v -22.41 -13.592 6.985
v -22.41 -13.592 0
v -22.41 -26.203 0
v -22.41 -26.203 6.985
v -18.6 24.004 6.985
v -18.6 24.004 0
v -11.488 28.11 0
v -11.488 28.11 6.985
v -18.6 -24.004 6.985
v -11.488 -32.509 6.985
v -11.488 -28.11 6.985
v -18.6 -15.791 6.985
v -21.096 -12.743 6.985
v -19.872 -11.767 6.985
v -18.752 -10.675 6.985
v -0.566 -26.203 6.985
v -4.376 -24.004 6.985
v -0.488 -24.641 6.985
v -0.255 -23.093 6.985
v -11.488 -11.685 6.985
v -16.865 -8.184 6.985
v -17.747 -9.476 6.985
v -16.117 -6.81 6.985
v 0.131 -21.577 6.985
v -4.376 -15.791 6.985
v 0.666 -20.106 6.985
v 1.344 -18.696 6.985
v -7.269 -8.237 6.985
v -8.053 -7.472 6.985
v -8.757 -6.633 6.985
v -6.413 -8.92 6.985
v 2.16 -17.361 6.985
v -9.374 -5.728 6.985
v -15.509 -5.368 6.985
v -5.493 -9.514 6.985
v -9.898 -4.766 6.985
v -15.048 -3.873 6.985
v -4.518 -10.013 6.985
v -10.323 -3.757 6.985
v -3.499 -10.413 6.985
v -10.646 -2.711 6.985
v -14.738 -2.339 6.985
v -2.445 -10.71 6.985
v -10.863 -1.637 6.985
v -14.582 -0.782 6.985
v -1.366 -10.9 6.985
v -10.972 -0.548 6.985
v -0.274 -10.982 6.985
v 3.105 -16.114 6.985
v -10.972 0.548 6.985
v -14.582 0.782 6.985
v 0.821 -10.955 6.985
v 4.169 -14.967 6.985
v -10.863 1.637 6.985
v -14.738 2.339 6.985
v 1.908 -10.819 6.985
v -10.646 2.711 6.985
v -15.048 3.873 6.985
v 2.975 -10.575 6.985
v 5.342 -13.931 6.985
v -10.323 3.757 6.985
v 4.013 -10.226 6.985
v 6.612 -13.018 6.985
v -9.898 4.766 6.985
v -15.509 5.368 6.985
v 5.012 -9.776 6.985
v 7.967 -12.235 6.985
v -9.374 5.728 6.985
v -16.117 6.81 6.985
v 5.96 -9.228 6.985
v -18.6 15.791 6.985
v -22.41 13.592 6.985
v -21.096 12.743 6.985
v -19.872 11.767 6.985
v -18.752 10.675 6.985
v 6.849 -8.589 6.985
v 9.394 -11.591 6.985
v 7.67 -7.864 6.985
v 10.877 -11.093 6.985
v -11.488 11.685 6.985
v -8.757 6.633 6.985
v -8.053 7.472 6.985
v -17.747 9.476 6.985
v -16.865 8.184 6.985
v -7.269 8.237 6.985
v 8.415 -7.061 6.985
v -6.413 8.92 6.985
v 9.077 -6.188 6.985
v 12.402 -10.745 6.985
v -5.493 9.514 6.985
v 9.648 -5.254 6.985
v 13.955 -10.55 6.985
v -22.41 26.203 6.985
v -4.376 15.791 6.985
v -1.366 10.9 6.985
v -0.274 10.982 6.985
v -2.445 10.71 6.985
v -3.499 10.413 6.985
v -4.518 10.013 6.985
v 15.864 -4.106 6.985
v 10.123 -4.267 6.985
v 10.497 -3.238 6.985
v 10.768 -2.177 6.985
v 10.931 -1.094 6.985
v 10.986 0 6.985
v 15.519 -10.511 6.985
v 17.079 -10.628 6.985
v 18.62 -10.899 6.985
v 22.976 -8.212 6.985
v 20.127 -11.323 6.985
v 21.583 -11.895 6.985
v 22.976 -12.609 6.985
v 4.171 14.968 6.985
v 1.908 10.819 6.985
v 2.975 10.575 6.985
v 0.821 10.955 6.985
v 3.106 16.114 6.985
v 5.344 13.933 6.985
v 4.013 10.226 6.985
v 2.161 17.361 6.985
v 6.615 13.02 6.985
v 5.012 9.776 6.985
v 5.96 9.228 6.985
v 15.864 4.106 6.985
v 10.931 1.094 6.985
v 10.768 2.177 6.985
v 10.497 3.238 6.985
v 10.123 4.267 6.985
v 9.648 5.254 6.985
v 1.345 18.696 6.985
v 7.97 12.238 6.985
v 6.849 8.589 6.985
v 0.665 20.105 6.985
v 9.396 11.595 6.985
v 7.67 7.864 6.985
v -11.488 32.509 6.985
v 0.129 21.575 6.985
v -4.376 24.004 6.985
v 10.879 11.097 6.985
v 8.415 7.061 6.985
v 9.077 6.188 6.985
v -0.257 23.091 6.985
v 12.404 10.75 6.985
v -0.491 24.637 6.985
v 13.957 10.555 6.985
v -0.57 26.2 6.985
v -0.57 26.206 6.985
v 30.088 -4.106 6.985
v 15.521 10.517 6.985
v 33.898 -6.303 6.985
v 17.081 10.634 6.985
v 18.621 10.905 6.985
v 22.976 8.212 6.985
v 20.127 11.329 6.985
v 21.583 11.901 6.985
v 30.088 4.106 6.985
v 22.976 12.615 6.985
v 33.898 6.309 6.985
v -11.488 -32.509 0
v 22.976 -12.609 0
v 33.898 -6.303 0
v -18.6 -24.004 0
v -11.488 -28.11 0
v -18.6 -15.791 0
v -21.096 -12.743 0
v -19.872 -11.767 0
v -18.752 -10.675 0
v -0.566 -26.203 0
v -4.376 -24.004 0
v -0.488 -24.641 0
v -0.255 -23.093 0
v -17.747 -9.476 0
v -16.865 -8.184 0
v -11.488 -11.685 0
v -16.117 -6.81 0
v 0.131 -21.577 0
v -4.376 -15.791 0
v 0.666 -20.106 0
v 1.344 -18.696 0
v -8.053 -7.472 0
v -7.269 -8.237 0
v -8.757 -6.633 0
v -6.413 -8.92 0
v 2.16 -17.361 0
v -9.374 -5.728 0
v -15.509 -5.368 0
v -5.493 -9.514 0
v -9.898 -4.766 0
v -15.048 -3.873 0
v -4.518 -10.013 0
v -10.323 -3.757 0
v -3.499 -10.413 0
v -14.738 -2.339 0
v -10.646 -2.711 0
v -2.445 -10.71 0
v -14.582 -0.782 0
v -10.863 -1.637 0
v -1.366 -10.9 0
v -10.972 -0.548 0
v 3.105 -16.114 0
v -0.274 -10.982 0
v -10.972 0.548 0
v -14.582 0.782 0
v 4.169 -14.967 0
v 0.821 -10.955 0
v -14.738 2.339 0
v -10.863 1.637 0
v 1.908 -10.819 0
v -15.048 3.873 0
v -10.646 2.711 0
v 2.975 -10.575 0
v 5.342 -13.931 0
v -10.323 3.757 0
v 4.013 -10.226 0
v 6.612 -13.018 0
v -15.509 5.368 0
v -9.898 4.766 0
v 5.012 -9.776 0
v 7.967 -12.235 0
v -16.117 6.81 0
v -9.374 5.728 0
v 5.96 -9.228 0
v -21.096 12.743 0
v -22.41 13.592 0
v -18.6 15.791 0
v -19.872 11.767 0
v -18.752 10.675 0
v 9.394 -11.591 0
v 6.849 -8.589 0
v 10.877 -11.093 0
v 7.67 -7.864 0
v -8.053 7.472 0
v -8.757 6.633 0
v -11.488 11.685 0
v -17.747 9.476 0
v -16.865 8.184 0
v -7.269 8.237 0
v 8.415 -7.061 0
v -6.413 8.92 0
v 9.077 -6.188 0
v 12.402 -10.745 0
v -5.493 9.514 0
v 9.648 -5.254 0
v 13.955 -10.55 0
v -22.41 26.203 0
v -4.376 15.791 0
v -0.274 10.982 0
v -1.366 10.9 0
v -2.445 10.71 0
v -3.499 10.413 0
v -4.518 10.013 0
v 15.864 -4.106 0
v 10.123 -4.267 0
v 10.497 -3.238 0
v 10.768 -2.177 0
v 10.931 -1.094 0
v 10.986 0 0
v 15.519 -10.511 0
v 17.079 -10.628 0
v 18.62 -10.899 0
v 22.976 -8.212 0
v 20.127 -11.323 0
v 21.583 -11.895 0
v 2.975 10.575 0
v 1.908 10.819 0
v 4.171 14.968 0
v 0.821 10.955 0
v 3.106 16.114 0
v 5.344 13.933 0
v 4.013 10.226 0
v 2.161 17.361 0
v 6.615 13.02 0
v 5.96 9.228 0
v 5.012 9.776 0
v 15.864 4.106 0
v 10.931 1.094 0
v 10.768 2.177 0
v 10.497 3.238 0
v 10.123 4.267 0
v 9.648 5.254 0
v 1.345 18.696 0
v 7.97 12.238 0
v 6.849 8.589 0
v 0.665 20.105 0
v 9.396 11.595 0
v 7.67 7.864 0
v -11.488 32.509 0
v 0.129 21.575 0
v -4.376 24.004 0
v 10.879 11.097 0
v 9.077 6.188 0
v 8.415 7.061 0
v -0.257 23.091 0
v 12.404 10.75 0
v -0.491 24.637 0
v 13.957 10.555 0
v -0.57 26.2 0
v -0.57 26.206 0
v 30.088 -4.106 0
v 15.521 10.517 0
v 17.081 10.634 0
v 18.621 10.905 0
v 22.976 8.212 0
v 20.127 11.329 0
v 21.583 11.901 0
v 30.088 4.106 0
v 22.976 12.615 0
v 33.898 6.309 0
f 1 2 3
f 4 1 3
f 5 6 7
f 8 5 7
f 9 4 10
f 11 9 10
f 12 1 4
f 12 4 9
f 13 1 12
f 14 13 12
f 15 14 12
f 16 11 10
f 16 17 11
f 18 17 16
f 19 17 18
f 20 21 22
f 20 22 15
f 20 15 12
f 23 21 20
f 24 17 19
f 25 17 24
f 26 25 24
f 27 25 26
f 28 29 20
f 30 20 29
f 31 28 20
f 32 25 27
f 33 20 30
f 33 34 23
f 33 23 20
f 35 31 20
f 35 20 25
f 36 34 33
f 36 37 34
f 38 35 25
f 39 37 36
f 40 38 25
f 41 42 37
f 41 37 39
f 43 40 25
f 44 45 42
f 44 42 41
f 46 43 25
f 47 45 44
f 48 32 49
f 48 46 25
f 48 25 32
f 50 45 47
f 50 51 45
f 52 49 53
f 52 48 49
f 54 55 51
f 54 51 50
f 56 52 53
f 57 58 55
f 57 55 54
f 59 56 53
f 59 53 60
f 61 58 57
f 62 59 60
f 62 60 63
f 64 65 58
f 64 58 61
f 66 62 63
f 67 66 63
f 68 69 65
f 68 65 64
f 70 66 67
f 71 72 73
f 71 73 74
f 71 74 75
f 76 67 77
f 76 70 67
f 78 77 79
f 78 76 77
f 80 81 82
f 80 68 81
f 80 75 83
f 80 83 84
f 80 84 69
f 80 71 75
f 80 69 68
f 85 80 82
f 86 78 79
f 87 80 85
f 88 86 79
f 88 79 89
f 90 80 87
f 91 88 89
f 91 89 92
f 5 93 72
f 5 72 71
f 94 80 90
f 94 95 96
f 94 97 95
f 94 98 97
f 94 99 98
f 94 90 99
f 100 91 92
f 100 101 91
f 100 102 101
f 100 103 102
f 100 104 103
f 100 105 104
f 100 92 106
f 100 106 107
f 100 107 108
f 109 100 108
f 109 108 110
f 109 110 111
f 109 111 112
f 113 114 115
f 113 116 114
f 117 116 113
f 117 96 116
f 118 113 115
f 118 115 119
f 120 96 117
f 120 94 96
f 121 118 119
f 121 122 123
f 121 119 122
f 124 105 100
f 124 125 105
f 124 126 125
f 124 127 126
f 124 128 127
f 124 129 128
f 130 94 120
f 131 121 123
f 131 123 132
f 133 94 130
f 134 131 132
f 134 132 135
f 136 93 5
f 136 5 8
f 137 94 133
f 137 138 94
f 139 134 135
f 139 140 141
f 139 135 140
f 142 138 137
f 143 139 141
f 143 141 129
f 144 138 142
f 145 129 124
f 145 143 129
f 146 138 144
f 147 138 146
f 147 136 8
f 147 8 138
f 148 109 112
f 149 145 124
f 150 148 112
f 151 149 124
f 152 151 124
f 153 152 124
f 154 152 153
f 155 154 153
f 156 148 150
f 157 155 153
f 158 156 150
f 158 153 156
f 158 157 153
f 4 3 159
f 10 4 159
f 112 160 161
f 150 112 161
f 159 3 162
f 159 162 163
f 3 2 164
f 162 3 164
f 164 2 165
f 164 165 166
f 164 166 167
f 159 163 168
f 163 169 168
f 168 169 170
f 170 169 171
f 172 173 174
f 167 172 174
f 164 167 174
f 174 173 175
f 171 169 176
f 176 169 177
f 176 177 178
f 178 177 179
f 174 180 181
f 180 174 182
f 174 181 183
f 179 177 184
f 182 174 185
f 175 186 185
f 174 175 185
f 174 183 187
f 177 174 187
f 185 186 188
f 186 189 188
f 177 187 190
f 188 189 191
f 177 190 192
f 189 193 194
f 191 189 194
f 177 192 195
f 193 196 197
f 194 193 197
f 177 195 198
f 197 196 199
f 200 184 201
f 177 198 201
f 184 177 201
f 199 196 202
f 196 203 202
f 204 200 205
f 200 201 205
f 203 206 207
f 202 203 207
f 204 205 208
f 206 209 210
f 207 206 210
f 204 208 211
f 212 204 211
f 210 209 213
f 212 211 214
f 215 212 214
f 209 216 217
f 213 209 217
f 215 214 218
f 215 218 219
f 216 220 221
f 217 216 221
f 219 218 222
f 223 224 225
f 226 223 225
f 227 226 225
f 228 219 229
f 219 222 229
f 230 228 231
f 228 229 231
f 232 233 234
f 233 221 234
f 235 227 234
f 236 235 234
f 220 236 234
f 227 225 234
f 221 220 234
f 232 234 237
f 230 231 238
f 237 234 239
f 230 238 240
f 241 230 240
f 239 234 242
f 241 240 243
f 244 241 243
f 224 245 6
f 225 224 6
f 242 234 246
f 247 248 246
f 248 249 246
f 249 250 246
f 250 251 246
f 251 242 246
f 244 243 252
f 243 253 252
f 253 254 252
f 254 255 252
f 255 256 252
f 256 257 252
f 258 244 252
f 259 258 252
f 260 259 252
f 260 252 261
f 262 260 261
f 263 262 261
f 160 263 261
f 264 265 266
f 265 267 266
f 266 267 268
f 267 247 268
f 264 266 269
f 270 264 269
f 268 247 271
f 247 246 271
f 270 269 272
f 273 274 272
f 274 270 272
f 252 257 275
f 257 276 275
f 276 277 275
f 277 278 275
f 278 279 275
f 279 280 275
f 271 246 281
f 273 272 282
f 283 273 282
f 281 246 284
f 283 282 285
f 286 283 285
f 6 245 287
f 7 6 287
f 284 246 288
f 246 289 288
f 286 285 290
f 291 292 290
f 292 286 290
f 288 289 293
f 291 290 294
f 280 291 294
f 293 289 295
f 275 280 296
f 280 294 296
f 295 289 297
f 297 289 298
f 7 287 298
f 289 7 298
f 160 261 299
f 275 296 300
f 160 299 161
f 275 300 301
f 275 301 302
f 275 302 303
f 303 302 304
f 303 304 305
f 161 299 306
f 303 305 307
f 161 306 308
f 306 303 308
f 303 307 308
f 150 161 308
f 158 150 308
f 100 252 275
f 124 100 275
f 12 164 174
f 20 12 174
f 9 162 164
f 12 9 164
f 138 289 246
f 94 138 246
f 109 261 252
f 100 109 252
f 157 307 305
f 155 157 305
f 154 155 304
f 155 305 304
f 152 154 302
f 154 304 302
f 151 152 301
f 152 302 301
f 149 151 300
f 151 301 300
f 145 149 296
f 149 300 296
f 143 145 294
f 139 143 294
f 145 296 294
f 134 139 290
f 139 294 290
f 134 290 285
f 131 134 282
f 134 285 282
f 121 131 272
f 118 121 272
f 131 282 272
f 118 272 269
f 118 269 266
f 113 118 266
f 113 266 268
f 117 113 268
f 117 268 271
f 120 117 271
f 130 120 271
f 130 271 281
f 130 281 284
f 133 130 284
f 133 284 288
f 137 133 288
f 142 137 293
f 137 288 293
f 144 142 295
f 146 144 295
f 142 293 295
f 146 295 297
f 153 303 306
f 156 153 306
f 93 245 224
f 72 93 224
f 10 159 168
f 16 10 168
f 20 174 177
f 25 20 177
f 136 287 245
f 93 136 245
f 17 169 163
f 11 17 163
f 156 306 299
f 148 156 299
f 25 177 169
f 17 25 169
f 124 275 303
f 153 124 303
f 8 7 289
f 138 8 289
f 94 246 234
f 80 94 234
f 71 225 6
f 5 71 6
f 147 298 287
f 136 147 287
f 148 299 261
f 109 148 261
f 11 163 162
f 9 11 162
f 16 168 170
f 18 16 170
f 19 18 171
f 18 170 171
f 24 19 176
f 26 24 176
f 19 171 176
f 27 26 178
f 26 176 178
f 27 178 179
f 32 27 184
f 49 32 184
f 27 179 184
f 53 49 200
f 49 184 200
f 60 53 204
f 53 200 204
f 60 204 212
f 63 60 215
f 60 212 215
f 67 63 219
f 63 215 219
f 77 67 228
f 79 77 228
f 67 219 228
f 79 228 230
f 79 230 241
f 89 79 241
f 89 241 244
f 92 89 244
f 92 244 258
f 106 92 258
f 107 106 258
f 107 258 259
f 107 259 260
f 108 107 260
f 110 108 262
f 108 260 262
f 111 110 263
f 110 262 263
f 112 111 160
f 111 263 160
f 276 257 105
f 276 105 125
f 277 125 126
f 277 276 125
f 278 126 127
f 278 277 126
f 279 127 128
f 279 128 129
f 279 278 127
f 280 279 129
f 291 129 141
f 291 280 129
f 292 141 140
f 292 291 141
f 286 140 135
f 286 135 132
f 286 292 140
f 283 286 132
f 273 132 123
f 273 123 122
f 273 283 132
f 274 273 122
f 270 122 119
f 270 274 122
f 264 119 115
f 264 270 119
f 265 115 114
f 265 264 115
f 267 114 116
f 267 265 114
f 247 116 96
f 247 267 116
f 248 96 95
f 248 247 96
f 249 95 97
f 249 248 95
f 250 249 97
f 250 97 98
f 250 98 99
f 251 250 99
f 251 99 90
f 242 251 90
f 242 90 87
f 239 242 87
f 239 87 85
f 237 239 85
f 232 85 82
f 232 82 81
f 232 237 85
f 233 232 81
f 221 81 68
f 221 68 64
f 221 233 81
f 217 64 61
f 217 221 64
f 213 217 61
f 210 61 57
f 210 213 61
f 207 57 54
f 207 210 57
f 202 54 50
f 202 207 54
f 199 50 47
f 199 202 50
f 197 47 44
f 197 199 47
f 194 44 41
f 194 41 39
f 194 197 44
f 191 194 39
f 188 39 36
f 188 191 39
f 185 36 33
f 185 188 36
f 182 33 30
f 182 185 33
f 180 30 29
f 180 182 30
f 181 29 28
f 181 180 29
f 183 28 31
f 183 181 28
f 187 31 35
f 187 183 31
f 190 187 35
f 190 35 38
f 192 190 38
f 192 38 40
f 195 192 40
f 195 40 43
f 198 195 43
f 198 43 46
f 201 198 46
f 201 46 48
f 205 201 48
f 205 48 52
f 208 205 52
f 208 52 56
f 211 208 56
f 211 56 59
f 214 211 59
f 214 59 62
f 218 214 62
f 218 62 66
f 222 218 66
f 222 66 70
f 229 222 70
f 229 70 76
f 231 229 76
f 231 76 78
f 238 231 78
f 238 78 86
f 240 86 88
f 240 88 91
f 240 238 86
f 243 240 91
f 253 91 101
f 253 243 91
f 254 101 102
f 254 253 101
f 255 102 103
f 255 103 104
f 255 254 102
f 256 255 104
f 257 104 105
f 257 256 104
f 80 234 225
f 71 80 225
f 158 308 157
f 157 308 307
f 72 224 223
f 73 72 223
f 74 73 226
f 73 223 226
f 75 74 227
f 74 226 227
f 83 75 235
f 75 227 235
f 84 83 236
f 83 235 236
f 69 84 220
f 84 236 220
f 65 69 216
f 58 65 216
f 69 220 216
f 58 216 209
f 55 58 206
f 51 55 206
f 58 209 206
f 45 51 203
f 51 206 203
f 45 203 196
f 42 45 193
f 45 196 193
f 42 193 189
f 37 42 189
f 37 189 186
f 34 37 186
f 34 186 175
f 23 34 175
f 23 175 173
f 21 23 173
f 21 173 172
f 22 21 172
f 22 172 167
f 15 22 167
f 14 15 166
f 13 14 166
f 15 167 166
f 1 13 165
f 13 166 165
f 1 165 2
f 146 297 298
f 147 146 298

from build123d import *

# Parameters (mm, degrees)
F0_R     = 10.9855
F1_DEPTH = 6.985


with BuildPart() as f1:
    # F0 (on Top) → F1 (new body)
    with BuildSketch(Plane.XY):
        with BuildLine():
            Line((-0.570141, 26.199883), (-0.570143, 26.205813))
            Line((-0.570143, 26.205813), (-11.487829, 32.509142))
            Line((-11.487829, 32.509142), (-22.409829, 26.203322))
            Line((-22.409829, 26.203322), (-22.409829, 13.591683))
            ThreePointArc((-22.409829, 13.591683), (-14.562667, 0), (-22.409828, -13.591683))
            Line((-22.409828, -13.591683), (-22.409828, -26.203322))
            Line((-22.409828, -26.203322), (-11.487828, -32.509142))
            Line((-11.487828, -32.509142), (-0.565829, -26.203322))
            ThreePointArc((-0.565829, -26.203322), (7.280049, -12.609415), (22.975657, -12.608674))
            Line((22.975657, -12.608674), (33.897656, -6.302854))
            Line((33.897656, -6.302854), (33.897656, 6.308785))
            Line((33.897656, 6.308785), (22.975657, 12.614604))
            ThreePointArc((22.975657, 12.614604), (7.282309, 12.612381), (-0.570141, 26.199883))
        make_face()
        Polygon((-18.599828, -24.003618), (-18.599828, -15.791388), (-11.487828, -11.685272), (-4.375828, -15.791388), (-4.375828, -24.003618), (-11.487828, -28.109733), align=None, mode=Mode.SUBTRACT)
        Circle(F0_R, mode=Mode.SUBTRACT)
        Polygon((22.975657, -8.21223), (15.863657, -4.106115), (15.863657, 4.106115), (22.975657, 8.21223), (30.087657, 4.106115), (30.087657, -4.106115), align=None, mode=Mode.SUBTRACT)
        Polygon((-11.487829, 28.109733), (-4.375829, 24.003618), (-4.375829, 15.791387), (-11.487829, 11.685272), (-18.599829, 15.791387), (-18.599829, 24.003618), align=None, mode=Mode.SUBTRACT)
    extrude(amount=F1_DEPTH)


solid = f1.part
